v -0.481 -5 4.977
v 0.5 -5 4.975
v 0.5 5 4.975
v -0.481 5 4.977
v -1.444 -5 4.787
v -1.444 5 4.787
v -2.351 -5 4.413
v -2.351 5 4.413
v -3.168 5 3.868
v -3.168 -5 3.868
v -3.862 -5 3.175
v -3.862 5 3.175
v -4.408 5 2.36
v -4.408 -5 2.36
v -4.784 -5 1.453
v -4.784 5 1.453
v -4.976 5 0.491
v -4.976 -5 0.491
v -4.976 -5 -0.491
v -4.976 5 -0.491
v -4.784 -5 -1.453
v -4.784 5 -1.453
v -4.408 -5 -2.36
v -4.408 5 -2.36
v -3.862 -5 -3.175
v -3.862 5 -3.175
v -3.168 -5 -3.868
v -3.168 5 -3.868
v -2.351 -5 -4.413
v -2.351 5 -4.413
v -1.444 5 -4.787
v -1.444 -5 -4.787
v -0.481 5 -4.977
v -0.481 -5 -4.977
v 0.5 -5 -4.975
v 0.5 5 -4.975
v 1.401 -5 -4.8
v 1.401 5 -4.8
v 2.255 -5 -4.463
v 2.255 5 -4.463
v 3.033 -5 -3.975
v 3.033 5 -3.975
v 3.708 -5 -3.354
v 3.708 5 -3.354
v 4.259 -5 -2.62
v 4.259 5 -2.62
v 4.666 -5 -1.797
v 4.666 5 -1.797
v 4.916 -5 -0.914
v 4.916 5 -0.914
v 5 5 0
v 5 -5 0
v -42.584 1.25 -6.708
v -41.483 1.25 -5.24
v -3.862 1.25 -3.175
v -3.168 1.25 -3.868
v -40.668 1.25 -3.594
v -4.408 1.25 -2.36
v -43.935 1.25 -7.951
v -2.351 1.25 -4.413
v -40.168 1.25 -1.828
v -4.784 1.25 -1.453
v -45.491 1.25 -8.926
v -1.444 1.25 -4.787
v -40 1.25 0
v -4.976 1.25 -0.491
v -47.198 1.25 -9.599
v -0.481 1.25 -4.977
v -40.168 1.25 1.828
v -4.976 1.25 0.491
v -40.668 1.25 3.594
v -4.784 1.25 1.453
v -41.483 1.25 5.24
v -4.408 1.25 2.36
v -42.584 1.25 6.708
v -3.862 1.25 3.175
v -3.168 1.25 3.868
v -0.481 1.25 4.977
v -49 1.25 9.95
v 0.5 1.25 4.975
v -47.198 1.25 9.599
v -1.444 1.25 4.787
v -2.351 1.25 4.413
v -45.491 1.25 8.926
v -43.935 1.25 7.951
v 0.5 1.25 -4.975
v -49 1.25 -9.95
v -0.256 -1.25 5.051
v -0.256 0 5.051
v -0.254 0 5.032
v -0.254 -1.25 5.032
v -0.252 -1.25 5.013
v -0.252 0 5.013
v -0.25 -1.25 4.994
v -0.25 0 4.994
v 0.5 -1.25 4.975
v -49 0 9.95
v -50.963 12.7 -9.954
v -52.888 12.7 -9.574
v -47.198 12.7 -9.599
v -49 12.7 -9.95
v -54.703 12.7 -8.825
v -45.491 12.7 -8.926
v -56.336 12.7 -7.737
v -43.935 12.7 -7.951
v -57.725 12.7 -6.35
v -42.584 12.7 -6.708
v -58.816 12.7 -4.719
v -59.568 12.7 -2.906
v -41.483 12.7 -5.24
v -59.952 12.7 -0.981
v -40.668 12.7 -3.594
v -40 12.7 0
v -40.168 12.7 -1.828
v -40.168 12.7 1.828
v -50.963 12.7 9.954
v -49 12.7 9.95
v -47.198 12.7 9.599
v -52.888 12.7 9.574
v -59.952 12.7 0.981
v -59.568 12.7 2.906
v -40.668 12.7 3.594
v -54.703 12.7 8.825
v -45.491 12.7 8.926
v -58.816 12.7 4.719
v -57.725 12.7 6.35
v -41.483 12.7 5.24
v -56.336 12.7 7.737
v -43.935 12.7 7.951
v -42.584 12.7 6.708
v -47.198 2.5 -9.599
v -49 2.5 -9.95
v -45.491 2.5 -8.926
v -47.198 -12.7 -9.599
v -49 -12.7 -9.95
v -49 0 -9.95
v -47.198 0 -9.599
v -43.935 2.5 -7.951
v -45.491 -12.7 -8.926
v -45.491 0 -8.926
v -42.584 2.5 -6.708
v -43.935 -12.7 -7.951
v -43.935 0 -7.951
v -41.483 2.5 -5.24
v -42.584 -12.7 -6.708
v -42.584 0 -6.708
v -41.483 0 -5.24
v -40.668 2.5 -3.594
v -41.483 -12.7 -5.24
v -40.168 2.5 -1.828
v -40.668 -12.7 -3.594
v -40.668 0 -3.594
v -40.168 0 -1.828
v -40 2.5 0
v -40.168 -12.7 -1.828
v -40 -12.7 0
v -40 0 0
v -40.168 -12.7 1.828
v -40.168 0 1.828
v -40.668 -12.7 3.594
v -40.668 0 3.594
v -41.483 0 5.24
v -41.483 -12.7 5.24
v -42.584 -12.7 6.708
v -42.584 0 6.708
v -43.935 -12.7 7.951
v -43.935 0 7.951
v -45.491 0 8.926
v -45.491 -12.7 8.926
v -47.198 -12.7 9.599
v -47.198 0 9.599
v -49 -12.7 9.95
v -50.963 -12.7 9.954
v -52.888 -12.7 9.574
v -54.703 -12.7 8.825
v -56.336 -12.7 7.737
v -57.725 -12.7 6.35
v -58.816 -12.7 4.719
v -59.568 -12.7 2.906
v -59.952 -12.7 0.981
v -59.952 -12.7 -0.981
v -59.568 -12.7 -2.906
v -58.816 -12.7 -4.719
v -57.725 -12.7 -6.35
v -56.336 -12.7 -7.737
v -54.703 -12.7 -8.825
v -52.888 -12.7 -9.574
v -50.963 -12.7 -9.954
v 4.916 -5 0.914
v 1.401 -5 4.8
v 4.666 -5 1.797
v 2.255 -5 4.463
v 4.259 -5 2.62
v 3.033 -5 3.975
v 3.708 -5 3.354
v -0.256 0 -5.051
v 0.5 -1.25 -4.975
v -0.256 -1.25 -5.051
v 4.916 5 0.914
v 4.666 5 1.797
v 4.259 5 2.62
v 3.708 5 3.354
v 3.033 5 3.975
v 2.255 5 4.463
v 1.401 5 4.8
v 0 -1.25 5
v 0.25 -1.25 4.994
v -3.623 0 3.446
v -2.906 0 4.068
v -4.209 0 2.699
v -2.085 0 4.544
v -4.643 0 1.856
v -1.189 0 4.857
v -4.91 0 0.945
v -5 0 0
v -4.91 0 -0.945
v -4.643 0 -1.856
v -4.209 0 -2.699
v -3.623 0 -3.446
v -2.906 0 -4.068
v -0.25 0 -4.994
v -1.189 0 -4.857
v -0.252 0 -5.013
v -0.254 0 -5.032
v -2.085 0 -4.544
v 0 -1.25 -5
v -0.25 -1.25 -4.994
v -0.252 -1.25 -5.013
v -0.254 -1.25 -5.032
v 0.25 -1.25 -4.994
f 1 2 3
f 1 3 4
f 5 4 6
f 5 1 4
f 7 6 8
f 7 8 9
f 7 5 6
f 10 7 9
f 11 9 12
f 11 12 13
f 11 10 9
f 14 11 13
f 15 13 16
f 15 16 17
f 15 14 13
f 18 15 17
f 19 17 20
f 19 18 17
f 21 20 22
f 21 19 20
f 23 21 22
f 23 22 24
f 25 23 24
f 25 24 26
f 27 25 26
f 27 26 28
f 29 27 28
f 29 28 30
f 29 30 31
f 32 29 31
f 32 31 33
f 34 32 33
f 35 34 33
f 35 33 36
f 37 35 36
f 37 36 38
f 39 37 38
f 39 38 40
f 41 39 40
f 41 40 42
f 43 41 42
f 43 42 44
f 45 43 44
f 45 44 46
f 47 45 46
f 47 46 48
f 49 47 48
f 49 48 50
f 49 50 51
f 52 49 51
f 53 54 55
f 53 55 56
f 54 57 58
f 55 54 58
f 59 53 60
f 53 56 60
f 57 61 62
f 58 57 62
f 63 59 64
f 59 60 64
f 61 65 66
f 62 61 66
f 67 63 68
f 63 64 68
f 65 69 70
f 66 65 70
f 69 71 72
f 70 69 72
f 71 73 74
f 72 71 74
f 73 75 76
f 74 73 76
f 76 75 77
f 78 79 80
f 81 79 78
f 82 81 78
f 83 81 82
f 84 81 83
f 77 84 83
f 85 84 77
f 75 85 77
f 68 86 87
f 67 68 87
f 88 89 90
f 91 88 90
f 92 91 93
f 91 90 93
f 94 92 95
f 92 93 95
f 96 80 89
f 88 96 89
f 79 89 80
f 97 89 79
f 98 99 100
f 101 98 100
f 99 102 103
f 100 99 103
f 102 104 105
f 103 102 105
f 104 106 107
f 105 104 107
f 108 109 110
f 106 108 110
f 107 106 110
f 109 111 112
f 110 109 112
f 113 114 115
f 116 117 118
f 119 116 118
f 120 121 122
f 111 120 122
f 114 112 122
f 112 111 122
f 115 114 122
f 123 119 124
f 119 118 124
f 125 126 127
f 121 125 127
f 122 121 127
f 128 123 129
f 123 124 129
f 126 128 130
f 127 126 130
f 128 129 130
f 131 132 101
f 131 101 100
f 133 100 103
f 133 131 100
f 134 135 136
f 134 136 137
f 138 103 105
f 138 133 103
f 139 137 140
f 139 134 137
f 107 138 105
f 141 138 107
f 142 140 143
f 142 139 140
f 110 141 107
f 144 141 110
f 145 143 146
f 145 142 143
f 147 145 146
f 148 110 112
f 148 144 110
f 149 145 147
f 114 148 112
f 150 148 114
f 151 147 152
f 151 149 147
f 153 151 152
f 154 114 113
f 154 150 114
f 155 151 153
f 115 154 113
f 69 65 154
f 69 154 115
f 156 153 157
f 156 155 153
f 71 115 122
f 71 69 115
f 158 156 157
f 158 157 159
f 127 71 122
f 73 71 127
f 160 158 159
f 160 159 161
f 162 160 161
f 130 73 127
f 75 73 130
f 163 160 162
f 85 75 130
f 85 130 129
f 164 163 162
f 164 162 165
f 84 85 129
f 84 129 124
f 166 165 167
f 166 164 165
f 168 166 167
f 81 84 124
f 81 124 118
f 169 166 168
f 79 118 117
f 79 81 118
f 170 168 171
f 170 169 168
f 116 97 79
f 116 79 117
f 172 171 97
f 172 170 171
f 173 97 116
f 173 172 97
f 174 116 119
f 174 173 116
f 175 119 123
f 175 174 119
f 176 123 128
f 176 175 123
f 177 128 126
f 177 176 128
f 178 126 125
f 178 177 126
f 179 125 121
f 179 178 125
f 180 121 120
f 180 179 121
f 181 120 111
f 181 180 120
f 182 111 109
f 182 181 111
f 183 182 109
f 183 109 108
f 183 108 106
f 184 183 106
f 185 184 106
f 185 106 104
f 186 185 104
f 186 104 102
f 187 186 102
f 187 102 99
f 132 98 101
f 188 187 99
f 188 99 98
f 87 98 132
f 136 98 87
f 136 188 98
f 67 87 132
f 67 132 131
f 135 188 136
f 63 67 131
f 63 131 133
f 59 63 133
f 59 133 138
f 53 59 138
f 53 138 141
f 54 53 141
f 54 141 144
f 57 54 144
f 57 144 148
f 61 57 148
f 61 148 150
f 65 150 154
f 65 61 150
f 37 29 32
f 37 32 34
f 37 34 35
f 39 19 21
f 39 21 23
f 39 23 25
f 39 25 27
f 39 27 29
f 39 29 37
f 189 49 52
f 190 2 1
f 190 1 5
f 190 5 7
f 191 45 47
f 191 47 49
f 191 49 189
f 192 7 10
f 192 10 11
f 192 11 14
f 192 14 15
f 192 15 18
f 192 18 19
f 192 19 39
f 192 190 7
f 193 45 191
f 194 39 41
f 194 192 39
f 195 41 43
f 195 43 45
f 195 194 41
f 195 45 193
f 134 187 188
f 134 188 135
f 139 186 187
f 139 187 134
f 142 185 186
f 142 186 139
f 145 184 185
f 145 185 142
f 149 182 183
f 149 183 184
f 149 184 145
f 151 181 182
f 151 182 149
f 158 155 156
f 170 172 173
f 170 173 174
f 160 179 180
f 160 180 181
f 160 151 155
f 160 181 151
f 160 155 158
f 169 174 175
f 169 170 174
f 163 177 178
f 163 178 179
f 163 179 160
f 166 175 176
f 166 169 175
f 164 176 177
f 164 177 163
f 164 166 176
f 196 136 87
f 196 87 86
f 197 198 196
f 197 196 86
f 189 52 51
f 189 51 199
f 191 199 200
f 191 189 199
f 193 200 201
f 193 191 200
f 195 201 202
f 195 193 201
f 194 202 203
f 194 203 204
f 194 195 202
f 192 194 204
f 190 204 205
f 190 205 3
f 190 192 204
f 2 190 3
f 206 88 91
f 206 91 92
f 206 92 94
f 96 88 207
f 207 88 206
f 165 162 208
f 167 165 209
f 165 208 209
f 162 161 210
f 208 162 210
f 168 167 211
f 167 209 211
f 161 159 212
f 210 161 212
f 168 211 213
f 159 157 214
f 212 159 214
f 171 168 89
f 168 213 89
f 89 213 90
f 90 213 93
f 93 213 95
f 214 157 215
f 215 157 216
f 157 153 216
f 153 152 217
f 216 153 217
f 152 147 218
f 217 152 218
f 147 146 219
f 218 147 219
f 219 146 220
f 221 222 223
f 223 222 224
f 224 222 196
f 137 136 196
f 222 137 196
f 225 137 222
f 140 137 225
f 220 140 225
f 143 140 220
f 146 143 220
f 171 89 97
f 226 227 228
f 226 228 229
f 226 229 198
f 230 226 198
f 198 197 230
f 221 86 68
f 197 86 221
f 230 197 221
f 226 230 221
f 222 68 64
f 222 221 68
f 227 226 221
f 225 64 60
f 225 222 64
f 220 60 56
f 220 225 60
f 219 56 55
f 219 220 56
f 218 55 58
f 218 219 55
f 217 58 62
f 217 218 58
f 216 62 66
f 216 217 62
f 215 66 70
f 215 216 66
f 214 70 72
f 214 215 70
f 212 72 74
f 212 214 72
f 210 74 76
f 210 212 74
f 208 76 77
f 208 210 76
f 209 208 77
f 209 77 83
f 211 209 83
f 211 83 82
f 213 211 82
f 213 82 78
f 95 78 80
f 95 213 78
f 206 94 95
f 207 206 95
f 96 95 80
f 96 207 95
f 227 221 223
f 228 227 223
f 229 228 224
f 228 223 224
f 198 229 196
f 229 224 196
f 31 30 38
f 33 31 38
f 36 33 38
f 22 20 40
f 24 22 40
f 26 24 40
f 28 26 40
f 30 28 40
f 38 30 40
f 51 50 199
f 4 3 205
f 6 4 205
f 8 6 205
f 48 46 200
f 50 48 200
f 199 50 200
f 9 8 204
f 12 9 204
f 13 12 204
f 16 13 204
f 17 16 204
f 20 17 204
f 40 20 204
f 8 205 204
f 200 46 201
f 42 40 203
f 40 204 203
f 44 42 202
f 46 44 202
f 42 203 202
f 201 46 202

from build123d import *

# Parameters (mm, degrees)
F1_DEPTH   = 2.5
F2_DEPTH   = 5
F3_DEPTH   = 1.25
F5_D       = 100
F5_DEPTH   = 12.7
F5_TIP     = 30.0430309514
F5_2_D     = 100
F5_2_DEPTH = 12.7
F5_2_TIP   = 30.0430309514
F6_DEPTH   = 12.7


# Not quite as in the source:
# - a feature of the source that left no trace in its solid (it failed there, or was rolled back) is left out


with BuildPart() as f1:
    # F0 (on Front) → F1 (new body, symmetric)
    with BuildSketch(Plane.XZ):
        with BuildLine():
            ThreePointArc((-40, 0), (-42.5838015129, 6.7082039325), (-49, 9.9498743711))
            ThreePointArc((-49, 9.9498743711), (-60, 0), (-49, -9.9498743711))
            ThreePointArc((-49, -9.9498743711), (-42.5838015129, -6.7082039325), (-40, 0))
        make_face()
    extrude(amount=F1_DEPTH, both=True)

    # F5 (one way)
    with BuildSketch(Plane(origin=(0, 0, 0), x_dir=(1, 0, 0), z_dir=(0, 1, 0))):
        with Locations((-50, 0)):
            Circle(F5_D / 2)
    extrude(amount=-F5_DEPTH, mode=Mode.SUBTRACT)
    with Locations(Plane(origin=(0, 0, 0), x_dir=(1, 0, 0), z_dir=(0, 1, 0))):
        with Locations((-50, 0)):
            with Locations((0, 0, -(F5_DEPTH + F5_TIP / 2))):  # 118° drill point
                Cone(0, F5_D / 2, F5_TIP, mode=Mode.SUBTRACT)



with BuildPart() as f2:
    # F0 (on Front) → F2 (new body, symmetric)
    with BuildSketch(Plane.XZ):
        with BuildLine():
            ThreePointArc((0.5, -4.9749371855), (3.7080992435, -3.3541019662), (5, 0))
            ThreePointArc((5, 0), (3.7080992435, 3.3541019662), (0.5, 4.9749371855))
            ThreePointArc((0.5, 4.9749371855), (-5, 0), (0.5, -4.9749371855))
        make_face()
    extrude(amount=F2_DEPTH, both=True)


with BuildPart() as f3:
    # F0 (on Front) → F3 (new body, symmetric)
    with BuildSketch(Plane.XZ):
        with BuildLine():
            ThreePointArc((0.5, -4.9749371855), (-5, 0), (0.5, 4.9749371855))
            Line((0.5, 4.9749371855), (-49, 9.9498743711))
            ThreePointArc((-49, 9.9498743711), (-42.5838015129, 6.7082039325), (-40, 0))
            ThreePointArc((-40, 0), (-42.5838015129, -6.7082039325), (-49, -9.9498743711))
            Line((-49, -9.9498743711), (0.5, -4.9749371855))
        make_face()
    extrude(amount=F3_DEPTH, both=True)

    # F5#2 (one way)
    with BuildSketch(Plane(origin=(0, 0, 0), x_dir=(1, 0, 0), z_dir=(0, 1, 0))):
        with Locations((-50, 0)):
            Circle(F5_2_D / 2)
    extrude(amount=-F5_2_DEPTH, mode=Mode.SUBTRACT)
    with Locations(Plane(origin=(0, 0, 0), x_dir=(1, 0, 0), z_dir=(0, 1, 0))):
        with Locations((-50, 0)):
            with Locations((0, 0, -(F5_2_DEPTH + F5_2_TIP / 2))):  # 118° drill point
                Cone(0, F5_2_D / 2, F5_2_TIP, mode=Mode.SUBTRACT)


with BuildPart() as f1_1:
    add(f1.part)

    add(f3.part)  # F6 merges F3
    # F0 (on Front) → F6 (join, symmetric)
    with BuildSketch(Plane.XZ):
        with BuildLine():
            ThreePointArc((-40, 0), (-42.5838015129, 6.7082039325), (-49, 9.9498743711))
            ThreePointArc((-49, 9.9498743711), (-60, 0), (-49, -9.9498743711))
            ThreePointArc((-49, -9.9498743711), (-42.5838015129, -6.7082039325), (-40, 0))
        make_face()
    extrude(amount=F6_DEPTH, both=True)


solid = Compound([f2.part, f1_1.part])
